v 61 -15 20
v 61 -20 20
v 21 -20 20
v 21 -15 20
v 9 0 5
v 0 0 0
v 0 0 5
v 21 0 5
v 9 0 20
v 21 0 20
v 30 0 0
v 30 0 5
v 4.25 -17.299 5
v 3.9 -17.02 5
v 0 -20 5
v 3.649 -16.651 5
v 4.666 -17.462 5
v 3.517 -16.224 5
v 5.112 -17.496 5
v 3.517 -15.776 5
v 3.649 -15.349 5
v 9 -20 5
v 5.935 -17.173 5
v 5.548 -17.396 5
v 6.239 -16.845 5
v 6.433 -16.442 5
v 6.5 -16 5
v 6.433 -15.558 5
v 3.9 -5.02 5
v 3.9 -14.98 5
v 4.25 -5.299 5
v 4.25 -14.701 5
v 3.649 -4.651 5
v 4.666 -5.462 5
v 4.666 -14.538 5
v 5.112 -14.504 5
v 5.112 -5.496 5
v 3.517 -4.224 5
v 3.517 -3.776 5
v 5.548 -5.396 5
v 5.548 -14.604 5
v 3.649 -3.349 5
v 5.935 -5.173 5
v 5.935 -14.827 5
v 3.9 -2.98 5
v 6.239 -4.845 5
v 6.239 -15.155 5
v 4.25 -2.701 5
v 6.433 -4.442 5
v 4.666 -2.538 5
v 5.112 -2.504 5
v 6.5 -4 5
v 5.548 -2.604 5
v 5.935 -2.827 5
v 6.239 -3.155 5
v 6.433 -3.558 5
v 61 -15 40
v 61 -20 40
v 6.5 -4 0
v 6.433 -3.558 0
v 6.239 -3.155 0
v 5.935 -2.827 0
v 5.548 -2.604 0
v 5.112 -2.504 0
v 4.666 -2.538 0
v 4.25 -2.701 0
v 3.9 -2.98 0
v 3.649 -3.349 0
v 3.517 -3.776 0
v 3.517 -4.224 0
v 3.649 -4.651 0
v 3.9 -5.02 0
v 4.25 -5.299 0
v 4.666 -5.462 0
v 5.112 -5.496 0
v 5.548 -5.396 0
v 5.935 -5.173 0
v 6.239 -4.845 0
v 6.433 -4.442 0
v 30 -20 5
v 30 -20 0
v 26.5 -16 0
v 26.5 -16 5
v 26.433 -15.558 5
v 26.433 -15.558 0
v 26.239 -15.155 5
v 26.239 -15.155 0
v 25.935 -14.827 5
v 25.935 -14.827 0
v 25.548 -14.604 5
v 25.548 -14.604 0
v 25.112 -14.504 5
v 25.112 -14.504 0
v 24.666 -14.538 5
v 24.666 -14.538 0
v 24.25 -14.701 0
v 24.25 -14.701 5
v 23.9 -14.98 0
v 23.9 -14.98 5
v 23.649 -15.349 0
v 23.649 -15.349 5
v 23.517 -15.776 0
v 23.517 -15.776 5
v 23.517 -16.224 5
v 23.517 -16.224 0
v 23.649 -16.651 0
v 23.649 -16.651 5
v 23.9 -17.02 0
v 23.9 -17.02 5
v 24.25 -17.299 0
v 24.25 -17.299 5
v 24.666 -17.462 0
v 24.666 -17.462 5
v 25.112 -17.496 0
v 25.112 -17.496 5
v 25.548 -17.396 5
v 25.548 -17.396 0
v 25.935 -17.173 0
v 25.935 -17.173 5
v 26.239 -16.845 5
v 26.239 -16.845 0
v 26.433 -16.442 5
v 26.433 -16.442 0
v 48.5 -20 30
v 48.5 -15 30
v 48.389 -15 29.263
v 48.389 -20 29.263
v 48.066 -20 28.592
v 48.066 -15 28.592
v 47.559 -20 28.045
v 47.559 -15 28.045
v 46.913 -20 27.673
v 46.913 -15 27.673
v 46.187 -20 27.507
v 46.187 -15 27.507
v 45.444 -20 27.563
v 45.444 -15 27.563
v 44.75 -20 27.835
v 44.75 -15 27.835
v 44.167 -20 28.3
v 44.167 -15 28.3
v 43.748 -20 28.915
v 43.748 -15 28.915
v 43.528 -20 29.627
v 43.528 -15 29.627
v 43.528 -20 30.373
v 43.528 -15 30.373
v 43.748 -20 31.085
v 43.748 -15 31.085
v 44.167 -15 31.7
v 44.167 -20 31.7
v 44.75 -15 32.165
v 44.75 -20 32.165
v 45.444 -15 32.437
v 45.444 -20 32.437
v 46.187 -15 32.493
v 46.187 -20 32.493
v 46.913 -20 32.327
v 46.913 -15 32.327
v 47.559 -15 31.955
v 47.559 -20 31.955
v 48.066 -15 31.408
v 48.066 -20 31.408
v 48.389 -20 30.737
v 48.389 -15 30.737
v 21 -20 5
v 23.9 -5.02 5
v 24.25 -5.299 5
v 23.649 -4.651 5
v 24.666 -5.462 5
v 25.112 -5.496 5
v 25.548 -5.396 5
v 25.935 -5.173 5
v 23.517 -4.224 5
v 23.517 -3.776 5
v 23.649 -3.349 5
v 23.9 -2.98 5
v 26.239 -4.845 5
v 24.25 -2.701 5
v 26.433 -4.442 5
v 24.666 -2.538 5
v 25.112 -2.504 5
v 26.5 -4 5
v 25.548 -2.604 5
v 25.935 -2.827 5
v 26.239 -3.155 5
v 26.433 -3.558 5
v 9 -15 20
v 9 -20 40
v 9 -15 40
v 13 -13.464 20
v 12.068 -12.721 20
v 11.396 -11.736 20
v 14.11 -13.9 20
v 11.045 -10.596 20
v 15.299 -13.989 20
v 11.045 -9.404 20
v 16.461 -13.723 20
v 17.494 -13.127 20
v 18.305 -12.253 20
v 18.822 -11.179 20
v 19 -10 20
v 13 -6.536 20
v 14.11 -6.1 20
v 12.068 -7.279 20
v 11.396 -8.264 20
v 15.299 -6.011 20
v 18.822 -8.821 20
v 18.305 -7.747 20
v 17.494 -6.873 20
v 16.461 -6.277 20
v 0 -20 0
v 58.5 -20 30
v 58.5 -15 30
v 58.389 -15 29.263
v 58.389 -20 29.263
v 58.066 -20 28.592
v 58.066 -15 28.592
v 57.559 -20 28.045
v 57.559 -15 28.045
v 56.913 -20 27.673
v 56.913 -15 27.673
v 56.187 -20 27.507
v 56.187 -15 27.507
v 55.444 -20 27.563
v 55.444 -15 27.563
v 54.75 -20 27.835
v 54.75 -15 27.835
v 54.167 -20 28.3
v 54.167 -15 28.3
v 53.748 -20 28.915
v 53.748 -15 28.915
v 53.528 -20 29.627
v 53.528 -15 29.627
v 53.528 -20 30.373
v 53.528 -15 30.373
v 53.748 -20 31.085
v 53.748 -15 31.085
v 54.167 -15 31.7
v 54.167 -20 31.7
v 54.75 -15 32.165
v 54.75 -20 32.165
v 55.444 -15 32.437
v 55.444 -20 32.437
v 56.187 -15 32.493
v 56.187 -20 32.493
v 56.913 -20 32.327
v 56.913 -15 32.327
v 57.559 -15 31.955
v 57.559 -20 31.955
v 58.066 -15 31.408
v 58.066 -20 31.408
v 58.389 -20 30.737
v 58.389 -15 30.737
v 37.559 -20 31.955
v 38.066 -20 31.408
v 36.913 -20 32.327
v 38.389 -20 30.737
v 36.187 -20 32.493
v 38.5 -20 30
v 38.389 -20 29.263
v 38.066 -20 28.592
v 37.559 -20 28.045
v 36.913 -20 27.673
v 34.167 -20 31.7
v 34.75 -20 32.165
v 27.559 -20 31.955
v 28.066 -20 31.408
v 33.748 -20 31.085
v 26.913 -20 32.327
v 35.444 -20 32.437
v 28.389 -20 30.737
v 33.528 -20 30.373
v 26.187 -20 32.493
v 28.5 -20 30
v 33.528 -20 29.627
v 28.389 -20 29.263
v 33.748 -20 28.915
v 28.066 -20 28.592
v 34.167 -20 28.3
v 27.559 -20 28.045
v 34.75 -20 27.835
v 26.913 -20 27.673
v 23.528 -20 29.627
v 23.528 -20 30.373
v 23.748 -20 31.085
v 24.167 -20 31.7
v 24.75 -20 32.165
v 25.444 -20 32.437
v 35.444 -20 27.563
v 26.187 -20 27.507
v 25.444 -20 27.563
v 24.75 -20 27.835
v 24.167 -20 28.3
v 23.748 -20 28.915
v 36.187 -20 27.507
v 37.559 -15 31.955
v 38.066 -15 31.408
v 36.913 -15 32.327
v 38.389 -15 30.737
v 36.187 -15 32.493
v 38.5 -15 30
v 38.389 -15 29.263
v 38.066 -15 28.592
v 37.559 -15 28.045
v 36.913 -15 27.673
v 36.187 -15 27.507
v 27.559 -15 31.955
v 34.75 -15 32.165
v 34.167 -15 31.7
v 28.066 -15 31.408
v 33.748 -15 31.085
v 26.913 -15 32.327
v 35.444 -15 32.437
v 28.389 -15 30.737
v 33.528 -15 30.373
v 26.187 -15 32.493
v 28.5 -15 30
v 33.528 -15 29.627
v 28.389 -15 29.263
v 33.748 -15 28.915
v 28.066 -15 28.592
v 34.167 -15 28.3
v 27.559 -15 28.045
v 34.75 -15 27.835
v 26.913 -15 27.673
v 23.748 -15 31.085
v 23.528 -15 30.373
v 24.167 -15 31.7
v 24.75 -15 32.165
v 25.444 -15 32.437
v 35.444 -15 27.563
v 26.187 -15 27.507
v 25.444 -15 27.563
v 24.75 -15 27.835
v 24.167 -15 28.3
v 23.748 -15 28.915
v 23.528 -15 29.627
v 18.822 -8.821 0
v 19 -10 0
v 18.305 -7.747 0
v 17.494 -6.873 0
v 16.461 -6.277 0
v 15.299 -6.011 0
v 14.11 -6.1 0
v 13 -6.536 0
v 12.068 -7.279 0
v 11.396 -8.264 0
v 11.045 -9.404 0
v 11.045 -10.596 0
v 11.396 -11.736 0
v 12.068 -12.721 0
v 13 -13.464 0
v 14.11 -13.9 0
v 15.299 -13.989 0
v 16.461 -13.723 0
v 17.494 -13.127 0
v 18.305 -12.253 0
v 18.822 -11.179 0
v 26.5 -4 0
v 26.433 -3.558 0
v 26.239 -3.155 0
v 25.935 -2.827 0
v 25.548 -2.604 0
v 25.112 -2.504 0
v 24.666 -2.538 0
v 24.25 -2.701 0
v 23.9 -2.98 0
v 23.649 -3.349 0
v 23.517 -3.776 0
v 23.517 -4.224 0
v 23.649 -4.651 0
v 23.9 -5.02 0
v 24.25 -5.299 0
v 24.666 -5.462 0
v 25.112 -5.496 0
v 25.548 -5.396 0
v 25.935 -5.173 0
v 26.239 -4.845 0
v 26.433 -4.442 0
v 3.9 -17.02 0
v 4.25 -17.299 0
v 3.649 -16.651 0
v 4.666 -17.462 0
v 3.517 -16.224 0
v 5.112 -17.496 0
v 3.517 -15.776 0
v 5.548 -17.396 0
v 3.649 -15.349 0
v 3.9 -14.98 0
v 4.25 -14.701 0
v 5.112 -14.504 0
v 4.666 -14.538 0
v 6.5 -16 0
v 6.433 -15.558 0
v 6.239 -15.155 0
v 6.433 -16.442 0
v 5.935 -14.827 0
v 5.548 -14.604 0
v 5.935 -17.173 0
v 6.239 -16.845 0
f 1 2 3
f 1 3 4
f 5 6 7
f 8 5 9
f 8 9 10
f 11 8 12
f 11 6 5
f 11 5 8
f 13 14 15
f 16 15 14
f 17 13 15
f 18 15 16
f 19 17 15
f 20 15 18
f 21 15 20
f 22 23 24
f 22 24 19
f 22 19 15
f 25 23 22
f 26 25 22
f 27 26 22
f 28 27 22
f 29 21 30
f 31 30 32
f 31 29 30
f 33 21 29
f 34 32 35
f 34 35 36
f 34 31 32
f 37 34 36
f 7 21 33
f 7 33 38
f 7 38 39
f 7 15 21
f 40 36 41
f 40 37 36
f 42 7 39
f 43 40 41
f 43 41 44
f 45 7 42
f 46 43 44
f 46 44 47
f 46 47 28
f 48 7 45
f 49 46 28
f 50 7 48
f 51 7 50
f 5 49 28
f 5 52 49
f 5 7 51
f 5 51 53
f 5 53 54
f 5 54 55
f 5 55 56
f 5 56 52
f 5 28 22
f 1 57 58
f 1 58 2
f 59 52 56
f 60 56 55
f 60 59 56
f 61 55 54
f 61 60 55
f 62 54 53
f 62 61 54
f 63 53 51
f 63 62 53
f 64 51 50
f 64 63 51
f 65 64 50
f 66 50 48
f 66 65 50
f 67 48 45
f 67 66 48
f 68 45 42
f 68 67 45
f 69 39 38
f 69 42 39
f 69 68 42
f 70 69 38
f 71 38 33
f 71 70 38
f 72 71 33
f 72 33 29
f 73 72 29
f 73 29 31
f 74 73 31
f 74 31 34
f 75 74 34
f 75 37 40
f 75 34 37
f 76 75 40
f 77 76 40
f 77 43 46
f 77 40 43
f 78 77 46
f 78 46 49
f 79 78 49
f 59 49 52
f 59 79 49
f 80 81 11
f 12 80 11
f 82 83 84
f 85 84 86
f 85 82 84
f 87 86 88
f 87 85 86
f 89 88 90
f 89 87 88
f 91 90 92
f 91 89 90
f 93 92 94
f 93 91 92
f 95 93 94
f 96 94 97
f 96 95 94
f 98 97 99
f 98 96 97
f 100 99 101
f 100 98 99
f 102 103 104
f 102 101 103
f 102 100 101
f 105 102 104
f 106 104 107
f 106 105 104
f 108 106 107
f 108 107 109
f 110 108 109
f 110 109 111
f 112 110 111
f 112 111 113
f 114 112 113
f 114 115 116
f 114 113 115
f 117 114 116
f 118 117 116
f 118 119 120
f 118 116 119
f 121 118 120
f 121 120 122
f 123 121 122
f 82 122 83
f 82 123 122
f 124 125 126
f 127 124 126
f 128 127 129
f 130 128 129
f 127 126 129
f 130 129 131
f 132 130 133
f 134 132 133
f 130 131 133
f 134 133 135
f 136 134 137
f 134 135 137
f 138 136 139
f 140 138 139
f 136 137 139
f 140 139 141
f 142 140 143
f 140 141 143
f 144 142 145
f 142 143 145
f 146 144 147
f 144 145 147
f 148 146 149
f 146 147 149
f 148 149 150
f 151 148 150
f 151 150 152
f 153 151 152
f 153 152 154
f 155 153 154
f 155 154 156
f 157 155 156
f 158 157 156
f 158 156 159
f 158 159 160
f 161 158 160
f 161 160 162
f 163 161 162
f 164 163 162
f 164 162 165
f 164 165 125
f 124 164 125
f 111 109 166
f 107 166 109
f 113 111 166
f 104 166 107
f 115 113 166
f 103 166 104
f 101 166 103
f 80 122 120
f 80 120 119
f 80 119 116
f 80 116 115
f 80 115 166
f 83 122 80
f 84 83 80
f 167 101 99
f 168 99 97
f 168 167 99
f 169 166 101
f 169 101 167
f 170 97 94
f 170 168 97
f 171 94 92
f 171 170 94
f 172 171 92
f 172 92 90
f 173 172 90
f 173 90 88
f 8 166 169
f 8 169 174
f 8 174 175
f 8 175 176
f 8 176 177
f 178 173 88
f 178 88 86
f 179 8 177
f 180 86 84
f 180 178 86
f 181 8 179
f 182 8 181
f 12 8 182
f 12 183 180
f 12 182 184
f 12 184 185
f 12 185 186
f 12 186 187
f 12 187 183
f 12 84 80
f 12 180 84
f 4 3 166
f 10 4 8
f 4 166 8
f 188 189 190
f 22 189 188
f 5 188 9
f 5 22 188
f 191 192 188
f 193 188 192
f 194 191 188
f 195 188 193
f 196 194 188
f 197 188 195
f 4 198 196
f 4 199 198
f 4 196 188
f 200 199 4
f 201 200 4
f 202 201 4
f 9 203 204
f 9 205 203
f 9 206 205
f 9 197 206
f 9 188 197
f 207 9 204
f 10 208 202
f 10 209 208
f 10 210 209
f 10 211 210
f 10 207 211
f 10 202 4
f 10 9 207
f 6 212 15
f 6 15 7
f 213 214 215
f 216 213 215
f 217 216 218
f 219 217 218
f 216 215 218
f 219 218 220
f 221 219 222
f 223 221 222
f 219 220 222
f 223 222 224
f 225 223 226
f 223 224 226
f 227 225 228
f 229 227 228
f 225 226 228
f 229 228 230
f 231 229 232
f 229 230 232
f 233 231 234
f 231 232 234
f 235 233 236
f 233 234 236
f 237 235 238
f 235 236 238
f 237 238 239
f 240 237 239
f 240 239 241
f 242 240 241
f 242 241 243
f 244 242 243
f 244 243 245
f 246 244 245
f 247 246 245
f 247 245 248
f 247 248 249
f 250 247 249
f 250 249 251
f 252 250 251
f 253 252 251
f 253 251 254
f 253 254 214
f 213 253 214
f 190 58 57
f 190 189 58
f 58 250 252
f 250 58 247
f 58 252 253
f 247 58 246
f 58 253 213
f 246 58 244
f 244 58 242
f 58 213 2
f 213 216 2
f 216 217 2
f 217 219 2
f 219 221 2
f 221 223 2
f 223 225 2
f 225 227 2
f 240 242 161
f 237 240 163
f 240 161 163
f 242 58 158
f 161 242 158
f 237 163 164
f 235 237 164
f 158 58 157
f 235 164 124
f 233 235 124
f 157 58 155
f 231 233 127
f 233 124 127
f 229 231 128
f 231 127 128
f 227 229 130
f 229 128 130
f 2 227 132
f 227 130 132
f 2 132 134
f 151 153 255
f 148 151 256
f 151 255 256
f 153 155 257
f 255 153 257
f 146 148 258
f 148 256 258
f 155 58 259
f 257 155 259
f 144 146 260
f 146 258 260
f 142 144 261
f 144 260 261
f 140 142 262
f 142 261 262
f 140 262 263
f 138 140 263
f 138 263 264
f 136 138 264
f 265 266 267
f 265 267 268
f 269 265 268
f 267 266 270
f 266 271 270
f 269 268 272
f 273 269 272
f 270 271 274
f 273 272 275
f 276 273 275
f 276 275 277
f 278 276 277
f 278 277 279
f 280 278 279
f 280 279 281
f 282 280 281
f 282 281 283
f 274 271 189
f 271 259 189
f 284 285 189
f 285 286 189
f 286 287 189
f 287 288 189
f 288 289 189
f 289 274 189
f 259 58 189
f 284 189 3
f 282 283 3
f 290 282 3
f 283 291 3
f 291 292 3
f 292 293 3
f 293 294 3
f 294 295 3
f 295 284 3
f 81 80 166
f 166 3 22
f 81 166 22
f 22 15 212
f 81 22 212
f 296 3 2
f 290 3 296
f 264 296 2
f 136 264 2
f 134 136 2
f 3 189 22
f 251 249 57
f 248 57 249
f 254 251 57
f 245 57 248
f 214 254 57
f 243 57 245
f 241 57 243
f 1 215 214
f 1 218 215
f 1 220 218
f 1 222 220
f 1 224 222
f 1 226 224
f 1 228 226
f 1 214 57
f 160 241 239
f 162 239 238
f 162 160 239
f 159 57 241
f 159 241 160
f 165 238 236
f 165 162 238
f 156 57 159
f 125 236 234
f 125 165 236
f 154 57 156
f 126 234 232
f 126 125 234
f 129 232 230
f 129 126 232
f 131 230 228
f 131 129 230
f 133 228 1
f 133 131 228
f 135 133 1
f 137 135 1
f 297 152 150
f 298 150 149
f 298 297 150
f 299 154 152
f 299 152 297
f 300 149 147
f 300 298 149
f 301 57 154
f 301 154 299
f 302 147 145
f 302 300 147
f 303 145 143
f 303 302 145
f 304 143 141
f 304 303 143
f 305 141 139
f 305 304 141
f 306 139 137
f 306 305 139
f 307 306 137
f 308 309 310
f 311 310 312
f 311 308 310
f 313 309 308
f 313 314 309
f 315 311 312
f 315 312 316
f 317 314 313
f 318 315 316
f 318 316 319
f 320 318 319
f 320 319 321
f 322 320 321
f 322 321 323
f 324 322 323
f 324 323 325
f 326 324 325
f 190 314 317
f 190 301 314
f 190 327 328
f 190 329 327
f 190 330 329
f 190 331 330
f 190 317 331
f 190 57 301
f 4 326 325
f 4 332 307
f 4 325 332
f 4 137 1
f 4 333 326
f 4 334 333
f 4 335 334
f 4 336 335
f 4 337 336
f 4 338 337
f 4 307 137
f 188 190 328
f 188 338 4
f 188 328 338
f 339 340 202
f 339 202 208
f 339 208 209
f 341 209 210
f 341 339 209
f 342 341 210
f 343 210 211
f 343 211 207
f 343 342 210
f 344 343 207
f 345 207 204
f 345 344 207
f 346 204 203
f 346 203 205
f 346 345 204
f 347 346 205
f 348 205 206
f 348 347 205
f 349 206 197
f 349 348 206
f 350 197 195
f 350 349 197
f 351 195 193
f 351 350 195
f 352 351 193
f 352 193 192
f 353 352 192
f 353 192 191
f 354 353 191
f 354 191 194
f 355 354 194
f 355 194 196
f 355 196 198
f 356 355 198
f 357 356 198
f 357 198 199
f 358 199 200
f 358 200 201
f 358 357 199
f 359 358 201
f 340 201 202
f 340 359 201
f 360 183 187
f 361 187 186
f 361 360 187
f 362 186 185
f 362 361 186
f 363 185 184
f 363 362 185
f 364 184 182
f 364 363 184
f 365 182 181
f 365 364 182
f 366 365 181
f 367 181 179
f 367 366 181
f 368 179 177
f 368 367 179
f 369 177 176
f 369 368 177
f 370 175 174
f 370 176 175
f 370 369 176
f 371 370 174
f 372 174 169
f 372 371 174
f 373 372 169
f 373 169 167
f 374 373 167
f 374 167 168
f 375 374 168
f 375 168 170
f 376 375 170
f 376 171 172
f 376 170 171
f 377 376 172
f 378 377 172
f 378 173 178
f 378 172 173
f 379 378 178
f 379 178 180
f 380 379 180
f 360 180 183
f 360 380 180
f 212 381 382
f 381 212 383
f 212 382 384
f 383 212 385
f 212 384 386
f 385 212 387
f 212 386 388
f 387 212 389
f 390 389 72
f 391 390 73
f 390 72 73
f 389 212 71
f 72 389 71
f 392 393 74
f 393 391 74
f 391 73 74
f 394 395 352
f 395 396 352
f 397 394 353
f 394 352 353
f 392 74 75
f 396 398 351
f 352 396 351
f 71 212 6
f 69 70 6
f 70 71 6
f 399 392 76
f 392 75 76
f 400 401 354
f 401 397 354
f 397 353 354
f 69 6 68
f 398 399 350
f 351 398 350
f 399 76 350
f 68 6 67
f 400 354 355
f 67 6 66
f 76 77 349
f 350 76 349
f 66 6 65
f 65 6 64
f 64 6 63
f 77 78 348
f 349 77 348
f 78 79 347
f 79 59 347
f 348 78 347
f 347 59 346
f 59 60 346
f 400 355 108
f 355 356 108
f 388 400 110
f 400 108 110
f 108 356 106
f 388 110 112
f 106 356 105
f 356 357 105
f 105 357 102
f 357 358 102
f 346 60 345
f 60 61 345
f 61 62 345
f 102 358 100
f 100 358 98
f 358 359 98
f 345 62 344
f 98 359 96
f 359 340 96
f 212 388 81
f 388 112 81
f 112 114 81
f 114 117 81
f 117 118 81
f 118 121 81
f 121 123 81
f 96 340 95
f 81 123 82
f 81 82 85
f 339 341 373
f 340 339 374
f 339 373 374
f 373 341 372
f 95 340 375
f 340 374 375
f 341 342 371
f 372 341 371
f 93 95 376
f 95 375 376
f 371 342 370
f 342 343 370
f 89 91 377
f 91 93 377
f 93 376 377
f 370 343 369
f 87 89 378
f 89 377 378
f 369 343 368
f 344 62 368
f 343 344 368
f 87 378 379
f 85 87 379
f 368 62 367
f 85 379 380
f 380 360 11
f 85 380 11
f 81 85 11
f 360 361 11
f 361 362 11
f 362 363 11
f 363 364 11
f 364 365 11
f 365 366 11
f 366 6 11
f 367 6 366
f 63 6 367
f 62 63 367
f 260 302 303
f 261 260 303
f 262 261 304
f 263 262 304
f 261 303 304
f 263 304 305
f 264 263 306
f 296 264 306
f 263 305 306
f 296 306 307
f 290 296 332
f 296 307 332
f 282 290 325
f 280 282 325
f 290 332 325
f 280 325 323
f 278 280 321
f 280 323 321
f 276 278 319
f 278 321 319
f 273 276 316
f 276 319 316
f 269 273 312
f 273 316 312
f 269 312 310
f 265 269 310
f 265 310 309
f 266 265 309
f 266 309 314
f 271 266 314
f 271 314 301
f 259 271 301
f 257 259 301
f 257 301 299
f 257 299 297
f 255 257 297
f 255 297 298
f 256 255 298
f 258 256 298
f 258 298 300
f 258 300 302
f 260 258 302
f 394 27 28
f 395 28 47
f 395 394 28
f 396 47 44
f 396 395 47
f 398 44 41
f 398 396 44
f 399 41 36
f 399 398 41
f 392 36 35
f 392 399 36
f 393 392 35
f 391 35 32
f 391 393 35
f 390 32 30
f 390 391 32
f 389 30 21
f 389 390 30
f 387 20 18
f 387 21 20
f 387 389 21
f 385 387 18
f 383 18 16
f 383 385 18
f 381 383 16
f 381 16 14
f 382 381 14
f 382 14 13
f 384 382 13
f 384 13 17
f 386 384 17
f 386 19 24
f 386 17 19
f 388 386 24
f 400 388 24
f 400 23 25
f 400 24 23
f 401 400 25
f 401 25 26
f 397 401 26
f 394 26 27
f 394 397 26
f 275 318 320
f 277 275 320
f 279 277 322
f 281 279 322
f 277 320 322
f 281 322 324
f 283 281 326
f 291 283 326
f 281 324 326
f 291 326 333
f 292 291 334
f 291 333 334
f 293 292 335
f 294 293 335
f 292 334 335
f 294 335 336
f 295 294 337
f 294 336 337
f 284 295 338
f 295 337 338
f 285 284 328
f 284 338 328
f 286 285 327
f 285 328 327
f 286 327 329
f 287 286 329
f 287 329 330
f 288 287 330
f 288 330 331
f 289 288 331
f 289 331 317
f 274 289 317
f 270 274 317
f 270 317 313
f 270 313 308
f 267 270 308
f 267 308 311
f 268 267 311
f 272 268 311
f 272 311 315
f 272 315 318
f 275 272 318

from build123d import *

# Parameters (mm, degrees)
SKETCH_1_W          = 30
SKETCH_1_H          = 20
SKETCH_1_R          = 1.5
SKETCH_1_R_2        = 4
EXTRUDE_1_DEPTH     = 20
SKETCH_2_W          = 9
SKETCH_2_H          = 20
CUT_EXTRUDE_1_DEPTH = 15
SKETCH_3_W          = 12
SKETCH_3_H          = 5
EXTRUDE_2_DEPTH     = 20
SKETCH_4_W          = 20
SKETCH_4_H          = 5
EXTRUDE_3_DEPTH     = 40
SKETCH_5_R          = 2.5
CUT_EXTRUDE_2_DEPTH = 20


with BuildPart() as part:
    # 草图1 → 凸台-拉伸1 (new body)
    with BuildSketch(Plane.XY):
        with Locations((15, -10)):
            Rectangle(SKETCH_1_W, SKETCH_1_H)
        with Locations((5, -4)):
            Circle(SKETCH_1_R, mode=Mode.SUBTRACT)
        with Locations((25, -4)):
            Circle(SKETCH_1_R, mode=Mode.SUBTRACT)
        with Locations((25, -16)):
            Circle(SKETCH_1_R, mode=Mode.SUBTRACT)
        with Locations((5, -16)):
            Circle(SKETCH_1_R, mode=Mode.SUBTRACT)
        with Locations((15, -10)):
            Circle(SKETCH_1_R_2, mode=Mode.SUBTRACT)
    extrude(amount=EXTRUDE_1_DEPTH)

    # 草图2 → 切除-拉伸1 (cut)
    with BuildSketch(Plane.XY.offset(20)):
        with Locations((4.5, -10)):
            Rectangle(SKETCH_2_W, SKETCH_2_H)
        with Locations((25.5, -10)):
            Rectangle(SKETCH_2_W, SKETCH_2_H)
    extrude(amount=-CUT_EXTRUDE_1_DEPTH, mode=Mode.SUBTRACT)

    # 草图3 → 凸台-拉伸2 (add)
    with BuildSketch(Plane.XY.offset(20)):
        with Locations((15, -17.5)):
            Rectangle(SKETCH_3_W, SKETCH_3_H)
    extrude(amount=EXTRUDE_2_DEPTH)

    # 草图4 → 凸台-拉伸3 (add)
    with BuildSketch(Plane(origin=(21, 0, 0), x_dir=(0, 0, -1), z_dir=(1, 0, 0))):
        with Locations((-30, -17.5)):
            Rectangle(SKETCH_4_W, SKETCH_4_H)
    extrude(amount=EXTRUDE_3_DEPTH)

    # 草图5 → 切除-拉伸2 (cut)
    with BuildSketch(Plane(origin=(0, -15, 0), x_dir=(1, 0, 0), z_dir=(0, 1, 0))):
        with Locations((26, -30)):
            Circle(SKETCH_5_R)
        with Locations((36, -30)):
            Circle(SKETCH_5_R)
        with Locations((46, -30)):
            Circle(SKETCH_5_R)
        with Locations((56, -30)):
            Circle(SKETCH_5_R)
    extrude(amount=-CUT_EXTRUDE_2_DEPTH, mode=Mode.SUBTRACT)


solid = part.part
